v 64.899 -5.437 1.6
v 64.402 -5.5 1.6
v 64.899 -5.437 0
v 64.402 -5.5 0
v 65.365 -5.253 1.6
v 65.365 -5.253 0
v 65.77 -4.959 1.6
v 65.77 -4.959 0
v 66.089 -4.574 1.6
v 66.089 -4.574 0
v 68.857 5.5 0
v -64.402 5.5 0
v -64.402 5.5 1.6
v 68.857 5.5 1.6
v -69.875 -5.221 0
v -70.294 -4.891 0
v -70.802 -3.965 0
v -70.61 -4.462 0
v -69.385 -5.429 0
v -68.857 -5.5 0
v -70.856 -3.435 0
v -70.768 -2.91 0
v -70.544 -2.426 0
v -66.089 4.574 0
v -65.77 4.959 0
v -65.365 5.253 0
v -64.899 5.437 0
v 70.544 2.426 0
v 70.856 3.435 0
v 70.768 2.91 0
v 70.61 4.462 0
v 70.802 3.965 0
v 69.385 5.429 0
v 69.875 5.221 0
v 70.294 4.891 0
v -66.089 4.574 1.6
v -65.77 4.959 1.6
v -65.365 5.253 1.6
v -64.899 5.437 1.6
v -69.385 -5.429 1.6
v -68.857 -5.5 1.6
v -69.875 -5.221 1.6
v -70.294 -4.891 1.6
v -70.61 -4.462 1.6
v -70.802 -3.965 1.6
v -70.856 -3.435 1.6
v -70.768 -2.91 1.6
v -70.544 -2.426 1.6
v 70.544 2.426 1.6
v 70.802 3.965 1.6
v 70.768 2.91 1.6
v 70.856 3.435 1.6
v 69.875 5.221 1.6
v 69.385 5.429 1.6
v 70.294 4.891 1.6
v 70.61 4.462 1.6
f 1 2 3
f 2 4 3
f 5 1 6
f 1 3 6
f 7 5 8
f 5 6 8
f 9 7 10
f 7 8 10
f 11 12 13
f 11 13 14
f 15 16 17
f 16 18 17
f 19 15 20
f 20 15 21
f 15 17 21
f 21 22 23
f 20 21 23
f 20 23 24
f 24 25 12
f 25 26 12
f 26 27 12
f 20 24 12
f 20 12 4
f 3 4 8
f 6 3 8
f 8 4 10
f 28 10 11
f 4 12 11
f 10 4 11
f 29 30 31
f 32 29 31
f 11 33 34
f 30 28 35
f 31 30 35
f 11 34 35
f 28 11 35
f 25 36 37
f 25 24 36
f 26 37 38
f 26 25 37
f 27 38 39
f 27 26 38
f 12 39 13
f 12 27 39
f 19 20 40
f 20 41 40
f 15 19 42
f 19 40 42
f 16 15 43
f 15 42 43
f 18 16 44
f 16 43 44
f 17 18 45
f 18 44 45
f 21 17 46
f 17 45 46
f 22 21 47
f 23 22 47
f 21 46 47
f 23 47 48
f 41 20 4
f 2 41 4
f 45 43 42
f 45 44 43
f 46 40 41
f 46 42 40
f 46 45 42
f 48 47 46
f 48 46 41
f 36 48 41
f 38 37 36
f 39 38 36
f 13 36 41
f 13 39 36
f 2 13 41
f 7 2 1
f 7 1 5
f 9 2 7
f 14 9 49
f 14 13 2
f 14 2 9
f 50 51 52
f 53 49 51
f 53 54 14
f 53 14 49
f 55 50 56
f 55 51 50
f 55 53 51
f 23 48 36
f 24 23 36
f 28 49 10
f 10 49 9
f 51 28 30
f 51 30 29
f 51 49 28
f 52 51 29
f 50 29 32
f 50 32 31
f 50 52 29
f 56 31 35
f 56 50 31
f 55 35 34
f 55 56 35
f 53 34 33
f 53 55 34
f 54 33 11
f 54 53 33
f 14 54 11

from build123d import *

# Parameters (mm, degrees)
SKETCH1_W           = 145
SKETCH1_H           = 11
BOSS_EXTRUDE1_DEPTH = 1.6
CUT_EXTRUDE1_DEPTH  = 73.725923851
FILLET2_R           = 2


with BuildPart() as part:
    # Sketch1 → Boss-Extrude1 (new body)
    with BuildSketch(Plane.XY):
        Rectangle(SKETCH1_W, SKETCH1_H)
    extrude(amount=BOSS_EXTRUDE1_DEPTH)

    # Sketch2 → Cut-Extrude1 (cut, through all)
    with BuildSketch(Plane.XY.offset(1.6)):
        Polygon((-72.5, -5.5), (-65.5, 5.5), (-72.5, 5.5), align=None)
        Polygon((72.5, 5.5), (65.5, -5.5), (72.5, -5.5), align=None)
    extrude(amount=-CUT_EXTRUDE1_DEPTH, mode=Mode.SUBTRACT)

    # Fillet2
    fillet2_edges = [part.edges().sort_by_distance(p)[0] for p in [
        (-65.5, 5.5, 0.8),
        (65.5, -5.5, 0.8),
        (-72.5, -5.5, 0.8),
        (72.5, 5.5, 0.8),
    ]]
    fillet(fillet2_edges, radius=FILLET2_R)


solid = part.part
